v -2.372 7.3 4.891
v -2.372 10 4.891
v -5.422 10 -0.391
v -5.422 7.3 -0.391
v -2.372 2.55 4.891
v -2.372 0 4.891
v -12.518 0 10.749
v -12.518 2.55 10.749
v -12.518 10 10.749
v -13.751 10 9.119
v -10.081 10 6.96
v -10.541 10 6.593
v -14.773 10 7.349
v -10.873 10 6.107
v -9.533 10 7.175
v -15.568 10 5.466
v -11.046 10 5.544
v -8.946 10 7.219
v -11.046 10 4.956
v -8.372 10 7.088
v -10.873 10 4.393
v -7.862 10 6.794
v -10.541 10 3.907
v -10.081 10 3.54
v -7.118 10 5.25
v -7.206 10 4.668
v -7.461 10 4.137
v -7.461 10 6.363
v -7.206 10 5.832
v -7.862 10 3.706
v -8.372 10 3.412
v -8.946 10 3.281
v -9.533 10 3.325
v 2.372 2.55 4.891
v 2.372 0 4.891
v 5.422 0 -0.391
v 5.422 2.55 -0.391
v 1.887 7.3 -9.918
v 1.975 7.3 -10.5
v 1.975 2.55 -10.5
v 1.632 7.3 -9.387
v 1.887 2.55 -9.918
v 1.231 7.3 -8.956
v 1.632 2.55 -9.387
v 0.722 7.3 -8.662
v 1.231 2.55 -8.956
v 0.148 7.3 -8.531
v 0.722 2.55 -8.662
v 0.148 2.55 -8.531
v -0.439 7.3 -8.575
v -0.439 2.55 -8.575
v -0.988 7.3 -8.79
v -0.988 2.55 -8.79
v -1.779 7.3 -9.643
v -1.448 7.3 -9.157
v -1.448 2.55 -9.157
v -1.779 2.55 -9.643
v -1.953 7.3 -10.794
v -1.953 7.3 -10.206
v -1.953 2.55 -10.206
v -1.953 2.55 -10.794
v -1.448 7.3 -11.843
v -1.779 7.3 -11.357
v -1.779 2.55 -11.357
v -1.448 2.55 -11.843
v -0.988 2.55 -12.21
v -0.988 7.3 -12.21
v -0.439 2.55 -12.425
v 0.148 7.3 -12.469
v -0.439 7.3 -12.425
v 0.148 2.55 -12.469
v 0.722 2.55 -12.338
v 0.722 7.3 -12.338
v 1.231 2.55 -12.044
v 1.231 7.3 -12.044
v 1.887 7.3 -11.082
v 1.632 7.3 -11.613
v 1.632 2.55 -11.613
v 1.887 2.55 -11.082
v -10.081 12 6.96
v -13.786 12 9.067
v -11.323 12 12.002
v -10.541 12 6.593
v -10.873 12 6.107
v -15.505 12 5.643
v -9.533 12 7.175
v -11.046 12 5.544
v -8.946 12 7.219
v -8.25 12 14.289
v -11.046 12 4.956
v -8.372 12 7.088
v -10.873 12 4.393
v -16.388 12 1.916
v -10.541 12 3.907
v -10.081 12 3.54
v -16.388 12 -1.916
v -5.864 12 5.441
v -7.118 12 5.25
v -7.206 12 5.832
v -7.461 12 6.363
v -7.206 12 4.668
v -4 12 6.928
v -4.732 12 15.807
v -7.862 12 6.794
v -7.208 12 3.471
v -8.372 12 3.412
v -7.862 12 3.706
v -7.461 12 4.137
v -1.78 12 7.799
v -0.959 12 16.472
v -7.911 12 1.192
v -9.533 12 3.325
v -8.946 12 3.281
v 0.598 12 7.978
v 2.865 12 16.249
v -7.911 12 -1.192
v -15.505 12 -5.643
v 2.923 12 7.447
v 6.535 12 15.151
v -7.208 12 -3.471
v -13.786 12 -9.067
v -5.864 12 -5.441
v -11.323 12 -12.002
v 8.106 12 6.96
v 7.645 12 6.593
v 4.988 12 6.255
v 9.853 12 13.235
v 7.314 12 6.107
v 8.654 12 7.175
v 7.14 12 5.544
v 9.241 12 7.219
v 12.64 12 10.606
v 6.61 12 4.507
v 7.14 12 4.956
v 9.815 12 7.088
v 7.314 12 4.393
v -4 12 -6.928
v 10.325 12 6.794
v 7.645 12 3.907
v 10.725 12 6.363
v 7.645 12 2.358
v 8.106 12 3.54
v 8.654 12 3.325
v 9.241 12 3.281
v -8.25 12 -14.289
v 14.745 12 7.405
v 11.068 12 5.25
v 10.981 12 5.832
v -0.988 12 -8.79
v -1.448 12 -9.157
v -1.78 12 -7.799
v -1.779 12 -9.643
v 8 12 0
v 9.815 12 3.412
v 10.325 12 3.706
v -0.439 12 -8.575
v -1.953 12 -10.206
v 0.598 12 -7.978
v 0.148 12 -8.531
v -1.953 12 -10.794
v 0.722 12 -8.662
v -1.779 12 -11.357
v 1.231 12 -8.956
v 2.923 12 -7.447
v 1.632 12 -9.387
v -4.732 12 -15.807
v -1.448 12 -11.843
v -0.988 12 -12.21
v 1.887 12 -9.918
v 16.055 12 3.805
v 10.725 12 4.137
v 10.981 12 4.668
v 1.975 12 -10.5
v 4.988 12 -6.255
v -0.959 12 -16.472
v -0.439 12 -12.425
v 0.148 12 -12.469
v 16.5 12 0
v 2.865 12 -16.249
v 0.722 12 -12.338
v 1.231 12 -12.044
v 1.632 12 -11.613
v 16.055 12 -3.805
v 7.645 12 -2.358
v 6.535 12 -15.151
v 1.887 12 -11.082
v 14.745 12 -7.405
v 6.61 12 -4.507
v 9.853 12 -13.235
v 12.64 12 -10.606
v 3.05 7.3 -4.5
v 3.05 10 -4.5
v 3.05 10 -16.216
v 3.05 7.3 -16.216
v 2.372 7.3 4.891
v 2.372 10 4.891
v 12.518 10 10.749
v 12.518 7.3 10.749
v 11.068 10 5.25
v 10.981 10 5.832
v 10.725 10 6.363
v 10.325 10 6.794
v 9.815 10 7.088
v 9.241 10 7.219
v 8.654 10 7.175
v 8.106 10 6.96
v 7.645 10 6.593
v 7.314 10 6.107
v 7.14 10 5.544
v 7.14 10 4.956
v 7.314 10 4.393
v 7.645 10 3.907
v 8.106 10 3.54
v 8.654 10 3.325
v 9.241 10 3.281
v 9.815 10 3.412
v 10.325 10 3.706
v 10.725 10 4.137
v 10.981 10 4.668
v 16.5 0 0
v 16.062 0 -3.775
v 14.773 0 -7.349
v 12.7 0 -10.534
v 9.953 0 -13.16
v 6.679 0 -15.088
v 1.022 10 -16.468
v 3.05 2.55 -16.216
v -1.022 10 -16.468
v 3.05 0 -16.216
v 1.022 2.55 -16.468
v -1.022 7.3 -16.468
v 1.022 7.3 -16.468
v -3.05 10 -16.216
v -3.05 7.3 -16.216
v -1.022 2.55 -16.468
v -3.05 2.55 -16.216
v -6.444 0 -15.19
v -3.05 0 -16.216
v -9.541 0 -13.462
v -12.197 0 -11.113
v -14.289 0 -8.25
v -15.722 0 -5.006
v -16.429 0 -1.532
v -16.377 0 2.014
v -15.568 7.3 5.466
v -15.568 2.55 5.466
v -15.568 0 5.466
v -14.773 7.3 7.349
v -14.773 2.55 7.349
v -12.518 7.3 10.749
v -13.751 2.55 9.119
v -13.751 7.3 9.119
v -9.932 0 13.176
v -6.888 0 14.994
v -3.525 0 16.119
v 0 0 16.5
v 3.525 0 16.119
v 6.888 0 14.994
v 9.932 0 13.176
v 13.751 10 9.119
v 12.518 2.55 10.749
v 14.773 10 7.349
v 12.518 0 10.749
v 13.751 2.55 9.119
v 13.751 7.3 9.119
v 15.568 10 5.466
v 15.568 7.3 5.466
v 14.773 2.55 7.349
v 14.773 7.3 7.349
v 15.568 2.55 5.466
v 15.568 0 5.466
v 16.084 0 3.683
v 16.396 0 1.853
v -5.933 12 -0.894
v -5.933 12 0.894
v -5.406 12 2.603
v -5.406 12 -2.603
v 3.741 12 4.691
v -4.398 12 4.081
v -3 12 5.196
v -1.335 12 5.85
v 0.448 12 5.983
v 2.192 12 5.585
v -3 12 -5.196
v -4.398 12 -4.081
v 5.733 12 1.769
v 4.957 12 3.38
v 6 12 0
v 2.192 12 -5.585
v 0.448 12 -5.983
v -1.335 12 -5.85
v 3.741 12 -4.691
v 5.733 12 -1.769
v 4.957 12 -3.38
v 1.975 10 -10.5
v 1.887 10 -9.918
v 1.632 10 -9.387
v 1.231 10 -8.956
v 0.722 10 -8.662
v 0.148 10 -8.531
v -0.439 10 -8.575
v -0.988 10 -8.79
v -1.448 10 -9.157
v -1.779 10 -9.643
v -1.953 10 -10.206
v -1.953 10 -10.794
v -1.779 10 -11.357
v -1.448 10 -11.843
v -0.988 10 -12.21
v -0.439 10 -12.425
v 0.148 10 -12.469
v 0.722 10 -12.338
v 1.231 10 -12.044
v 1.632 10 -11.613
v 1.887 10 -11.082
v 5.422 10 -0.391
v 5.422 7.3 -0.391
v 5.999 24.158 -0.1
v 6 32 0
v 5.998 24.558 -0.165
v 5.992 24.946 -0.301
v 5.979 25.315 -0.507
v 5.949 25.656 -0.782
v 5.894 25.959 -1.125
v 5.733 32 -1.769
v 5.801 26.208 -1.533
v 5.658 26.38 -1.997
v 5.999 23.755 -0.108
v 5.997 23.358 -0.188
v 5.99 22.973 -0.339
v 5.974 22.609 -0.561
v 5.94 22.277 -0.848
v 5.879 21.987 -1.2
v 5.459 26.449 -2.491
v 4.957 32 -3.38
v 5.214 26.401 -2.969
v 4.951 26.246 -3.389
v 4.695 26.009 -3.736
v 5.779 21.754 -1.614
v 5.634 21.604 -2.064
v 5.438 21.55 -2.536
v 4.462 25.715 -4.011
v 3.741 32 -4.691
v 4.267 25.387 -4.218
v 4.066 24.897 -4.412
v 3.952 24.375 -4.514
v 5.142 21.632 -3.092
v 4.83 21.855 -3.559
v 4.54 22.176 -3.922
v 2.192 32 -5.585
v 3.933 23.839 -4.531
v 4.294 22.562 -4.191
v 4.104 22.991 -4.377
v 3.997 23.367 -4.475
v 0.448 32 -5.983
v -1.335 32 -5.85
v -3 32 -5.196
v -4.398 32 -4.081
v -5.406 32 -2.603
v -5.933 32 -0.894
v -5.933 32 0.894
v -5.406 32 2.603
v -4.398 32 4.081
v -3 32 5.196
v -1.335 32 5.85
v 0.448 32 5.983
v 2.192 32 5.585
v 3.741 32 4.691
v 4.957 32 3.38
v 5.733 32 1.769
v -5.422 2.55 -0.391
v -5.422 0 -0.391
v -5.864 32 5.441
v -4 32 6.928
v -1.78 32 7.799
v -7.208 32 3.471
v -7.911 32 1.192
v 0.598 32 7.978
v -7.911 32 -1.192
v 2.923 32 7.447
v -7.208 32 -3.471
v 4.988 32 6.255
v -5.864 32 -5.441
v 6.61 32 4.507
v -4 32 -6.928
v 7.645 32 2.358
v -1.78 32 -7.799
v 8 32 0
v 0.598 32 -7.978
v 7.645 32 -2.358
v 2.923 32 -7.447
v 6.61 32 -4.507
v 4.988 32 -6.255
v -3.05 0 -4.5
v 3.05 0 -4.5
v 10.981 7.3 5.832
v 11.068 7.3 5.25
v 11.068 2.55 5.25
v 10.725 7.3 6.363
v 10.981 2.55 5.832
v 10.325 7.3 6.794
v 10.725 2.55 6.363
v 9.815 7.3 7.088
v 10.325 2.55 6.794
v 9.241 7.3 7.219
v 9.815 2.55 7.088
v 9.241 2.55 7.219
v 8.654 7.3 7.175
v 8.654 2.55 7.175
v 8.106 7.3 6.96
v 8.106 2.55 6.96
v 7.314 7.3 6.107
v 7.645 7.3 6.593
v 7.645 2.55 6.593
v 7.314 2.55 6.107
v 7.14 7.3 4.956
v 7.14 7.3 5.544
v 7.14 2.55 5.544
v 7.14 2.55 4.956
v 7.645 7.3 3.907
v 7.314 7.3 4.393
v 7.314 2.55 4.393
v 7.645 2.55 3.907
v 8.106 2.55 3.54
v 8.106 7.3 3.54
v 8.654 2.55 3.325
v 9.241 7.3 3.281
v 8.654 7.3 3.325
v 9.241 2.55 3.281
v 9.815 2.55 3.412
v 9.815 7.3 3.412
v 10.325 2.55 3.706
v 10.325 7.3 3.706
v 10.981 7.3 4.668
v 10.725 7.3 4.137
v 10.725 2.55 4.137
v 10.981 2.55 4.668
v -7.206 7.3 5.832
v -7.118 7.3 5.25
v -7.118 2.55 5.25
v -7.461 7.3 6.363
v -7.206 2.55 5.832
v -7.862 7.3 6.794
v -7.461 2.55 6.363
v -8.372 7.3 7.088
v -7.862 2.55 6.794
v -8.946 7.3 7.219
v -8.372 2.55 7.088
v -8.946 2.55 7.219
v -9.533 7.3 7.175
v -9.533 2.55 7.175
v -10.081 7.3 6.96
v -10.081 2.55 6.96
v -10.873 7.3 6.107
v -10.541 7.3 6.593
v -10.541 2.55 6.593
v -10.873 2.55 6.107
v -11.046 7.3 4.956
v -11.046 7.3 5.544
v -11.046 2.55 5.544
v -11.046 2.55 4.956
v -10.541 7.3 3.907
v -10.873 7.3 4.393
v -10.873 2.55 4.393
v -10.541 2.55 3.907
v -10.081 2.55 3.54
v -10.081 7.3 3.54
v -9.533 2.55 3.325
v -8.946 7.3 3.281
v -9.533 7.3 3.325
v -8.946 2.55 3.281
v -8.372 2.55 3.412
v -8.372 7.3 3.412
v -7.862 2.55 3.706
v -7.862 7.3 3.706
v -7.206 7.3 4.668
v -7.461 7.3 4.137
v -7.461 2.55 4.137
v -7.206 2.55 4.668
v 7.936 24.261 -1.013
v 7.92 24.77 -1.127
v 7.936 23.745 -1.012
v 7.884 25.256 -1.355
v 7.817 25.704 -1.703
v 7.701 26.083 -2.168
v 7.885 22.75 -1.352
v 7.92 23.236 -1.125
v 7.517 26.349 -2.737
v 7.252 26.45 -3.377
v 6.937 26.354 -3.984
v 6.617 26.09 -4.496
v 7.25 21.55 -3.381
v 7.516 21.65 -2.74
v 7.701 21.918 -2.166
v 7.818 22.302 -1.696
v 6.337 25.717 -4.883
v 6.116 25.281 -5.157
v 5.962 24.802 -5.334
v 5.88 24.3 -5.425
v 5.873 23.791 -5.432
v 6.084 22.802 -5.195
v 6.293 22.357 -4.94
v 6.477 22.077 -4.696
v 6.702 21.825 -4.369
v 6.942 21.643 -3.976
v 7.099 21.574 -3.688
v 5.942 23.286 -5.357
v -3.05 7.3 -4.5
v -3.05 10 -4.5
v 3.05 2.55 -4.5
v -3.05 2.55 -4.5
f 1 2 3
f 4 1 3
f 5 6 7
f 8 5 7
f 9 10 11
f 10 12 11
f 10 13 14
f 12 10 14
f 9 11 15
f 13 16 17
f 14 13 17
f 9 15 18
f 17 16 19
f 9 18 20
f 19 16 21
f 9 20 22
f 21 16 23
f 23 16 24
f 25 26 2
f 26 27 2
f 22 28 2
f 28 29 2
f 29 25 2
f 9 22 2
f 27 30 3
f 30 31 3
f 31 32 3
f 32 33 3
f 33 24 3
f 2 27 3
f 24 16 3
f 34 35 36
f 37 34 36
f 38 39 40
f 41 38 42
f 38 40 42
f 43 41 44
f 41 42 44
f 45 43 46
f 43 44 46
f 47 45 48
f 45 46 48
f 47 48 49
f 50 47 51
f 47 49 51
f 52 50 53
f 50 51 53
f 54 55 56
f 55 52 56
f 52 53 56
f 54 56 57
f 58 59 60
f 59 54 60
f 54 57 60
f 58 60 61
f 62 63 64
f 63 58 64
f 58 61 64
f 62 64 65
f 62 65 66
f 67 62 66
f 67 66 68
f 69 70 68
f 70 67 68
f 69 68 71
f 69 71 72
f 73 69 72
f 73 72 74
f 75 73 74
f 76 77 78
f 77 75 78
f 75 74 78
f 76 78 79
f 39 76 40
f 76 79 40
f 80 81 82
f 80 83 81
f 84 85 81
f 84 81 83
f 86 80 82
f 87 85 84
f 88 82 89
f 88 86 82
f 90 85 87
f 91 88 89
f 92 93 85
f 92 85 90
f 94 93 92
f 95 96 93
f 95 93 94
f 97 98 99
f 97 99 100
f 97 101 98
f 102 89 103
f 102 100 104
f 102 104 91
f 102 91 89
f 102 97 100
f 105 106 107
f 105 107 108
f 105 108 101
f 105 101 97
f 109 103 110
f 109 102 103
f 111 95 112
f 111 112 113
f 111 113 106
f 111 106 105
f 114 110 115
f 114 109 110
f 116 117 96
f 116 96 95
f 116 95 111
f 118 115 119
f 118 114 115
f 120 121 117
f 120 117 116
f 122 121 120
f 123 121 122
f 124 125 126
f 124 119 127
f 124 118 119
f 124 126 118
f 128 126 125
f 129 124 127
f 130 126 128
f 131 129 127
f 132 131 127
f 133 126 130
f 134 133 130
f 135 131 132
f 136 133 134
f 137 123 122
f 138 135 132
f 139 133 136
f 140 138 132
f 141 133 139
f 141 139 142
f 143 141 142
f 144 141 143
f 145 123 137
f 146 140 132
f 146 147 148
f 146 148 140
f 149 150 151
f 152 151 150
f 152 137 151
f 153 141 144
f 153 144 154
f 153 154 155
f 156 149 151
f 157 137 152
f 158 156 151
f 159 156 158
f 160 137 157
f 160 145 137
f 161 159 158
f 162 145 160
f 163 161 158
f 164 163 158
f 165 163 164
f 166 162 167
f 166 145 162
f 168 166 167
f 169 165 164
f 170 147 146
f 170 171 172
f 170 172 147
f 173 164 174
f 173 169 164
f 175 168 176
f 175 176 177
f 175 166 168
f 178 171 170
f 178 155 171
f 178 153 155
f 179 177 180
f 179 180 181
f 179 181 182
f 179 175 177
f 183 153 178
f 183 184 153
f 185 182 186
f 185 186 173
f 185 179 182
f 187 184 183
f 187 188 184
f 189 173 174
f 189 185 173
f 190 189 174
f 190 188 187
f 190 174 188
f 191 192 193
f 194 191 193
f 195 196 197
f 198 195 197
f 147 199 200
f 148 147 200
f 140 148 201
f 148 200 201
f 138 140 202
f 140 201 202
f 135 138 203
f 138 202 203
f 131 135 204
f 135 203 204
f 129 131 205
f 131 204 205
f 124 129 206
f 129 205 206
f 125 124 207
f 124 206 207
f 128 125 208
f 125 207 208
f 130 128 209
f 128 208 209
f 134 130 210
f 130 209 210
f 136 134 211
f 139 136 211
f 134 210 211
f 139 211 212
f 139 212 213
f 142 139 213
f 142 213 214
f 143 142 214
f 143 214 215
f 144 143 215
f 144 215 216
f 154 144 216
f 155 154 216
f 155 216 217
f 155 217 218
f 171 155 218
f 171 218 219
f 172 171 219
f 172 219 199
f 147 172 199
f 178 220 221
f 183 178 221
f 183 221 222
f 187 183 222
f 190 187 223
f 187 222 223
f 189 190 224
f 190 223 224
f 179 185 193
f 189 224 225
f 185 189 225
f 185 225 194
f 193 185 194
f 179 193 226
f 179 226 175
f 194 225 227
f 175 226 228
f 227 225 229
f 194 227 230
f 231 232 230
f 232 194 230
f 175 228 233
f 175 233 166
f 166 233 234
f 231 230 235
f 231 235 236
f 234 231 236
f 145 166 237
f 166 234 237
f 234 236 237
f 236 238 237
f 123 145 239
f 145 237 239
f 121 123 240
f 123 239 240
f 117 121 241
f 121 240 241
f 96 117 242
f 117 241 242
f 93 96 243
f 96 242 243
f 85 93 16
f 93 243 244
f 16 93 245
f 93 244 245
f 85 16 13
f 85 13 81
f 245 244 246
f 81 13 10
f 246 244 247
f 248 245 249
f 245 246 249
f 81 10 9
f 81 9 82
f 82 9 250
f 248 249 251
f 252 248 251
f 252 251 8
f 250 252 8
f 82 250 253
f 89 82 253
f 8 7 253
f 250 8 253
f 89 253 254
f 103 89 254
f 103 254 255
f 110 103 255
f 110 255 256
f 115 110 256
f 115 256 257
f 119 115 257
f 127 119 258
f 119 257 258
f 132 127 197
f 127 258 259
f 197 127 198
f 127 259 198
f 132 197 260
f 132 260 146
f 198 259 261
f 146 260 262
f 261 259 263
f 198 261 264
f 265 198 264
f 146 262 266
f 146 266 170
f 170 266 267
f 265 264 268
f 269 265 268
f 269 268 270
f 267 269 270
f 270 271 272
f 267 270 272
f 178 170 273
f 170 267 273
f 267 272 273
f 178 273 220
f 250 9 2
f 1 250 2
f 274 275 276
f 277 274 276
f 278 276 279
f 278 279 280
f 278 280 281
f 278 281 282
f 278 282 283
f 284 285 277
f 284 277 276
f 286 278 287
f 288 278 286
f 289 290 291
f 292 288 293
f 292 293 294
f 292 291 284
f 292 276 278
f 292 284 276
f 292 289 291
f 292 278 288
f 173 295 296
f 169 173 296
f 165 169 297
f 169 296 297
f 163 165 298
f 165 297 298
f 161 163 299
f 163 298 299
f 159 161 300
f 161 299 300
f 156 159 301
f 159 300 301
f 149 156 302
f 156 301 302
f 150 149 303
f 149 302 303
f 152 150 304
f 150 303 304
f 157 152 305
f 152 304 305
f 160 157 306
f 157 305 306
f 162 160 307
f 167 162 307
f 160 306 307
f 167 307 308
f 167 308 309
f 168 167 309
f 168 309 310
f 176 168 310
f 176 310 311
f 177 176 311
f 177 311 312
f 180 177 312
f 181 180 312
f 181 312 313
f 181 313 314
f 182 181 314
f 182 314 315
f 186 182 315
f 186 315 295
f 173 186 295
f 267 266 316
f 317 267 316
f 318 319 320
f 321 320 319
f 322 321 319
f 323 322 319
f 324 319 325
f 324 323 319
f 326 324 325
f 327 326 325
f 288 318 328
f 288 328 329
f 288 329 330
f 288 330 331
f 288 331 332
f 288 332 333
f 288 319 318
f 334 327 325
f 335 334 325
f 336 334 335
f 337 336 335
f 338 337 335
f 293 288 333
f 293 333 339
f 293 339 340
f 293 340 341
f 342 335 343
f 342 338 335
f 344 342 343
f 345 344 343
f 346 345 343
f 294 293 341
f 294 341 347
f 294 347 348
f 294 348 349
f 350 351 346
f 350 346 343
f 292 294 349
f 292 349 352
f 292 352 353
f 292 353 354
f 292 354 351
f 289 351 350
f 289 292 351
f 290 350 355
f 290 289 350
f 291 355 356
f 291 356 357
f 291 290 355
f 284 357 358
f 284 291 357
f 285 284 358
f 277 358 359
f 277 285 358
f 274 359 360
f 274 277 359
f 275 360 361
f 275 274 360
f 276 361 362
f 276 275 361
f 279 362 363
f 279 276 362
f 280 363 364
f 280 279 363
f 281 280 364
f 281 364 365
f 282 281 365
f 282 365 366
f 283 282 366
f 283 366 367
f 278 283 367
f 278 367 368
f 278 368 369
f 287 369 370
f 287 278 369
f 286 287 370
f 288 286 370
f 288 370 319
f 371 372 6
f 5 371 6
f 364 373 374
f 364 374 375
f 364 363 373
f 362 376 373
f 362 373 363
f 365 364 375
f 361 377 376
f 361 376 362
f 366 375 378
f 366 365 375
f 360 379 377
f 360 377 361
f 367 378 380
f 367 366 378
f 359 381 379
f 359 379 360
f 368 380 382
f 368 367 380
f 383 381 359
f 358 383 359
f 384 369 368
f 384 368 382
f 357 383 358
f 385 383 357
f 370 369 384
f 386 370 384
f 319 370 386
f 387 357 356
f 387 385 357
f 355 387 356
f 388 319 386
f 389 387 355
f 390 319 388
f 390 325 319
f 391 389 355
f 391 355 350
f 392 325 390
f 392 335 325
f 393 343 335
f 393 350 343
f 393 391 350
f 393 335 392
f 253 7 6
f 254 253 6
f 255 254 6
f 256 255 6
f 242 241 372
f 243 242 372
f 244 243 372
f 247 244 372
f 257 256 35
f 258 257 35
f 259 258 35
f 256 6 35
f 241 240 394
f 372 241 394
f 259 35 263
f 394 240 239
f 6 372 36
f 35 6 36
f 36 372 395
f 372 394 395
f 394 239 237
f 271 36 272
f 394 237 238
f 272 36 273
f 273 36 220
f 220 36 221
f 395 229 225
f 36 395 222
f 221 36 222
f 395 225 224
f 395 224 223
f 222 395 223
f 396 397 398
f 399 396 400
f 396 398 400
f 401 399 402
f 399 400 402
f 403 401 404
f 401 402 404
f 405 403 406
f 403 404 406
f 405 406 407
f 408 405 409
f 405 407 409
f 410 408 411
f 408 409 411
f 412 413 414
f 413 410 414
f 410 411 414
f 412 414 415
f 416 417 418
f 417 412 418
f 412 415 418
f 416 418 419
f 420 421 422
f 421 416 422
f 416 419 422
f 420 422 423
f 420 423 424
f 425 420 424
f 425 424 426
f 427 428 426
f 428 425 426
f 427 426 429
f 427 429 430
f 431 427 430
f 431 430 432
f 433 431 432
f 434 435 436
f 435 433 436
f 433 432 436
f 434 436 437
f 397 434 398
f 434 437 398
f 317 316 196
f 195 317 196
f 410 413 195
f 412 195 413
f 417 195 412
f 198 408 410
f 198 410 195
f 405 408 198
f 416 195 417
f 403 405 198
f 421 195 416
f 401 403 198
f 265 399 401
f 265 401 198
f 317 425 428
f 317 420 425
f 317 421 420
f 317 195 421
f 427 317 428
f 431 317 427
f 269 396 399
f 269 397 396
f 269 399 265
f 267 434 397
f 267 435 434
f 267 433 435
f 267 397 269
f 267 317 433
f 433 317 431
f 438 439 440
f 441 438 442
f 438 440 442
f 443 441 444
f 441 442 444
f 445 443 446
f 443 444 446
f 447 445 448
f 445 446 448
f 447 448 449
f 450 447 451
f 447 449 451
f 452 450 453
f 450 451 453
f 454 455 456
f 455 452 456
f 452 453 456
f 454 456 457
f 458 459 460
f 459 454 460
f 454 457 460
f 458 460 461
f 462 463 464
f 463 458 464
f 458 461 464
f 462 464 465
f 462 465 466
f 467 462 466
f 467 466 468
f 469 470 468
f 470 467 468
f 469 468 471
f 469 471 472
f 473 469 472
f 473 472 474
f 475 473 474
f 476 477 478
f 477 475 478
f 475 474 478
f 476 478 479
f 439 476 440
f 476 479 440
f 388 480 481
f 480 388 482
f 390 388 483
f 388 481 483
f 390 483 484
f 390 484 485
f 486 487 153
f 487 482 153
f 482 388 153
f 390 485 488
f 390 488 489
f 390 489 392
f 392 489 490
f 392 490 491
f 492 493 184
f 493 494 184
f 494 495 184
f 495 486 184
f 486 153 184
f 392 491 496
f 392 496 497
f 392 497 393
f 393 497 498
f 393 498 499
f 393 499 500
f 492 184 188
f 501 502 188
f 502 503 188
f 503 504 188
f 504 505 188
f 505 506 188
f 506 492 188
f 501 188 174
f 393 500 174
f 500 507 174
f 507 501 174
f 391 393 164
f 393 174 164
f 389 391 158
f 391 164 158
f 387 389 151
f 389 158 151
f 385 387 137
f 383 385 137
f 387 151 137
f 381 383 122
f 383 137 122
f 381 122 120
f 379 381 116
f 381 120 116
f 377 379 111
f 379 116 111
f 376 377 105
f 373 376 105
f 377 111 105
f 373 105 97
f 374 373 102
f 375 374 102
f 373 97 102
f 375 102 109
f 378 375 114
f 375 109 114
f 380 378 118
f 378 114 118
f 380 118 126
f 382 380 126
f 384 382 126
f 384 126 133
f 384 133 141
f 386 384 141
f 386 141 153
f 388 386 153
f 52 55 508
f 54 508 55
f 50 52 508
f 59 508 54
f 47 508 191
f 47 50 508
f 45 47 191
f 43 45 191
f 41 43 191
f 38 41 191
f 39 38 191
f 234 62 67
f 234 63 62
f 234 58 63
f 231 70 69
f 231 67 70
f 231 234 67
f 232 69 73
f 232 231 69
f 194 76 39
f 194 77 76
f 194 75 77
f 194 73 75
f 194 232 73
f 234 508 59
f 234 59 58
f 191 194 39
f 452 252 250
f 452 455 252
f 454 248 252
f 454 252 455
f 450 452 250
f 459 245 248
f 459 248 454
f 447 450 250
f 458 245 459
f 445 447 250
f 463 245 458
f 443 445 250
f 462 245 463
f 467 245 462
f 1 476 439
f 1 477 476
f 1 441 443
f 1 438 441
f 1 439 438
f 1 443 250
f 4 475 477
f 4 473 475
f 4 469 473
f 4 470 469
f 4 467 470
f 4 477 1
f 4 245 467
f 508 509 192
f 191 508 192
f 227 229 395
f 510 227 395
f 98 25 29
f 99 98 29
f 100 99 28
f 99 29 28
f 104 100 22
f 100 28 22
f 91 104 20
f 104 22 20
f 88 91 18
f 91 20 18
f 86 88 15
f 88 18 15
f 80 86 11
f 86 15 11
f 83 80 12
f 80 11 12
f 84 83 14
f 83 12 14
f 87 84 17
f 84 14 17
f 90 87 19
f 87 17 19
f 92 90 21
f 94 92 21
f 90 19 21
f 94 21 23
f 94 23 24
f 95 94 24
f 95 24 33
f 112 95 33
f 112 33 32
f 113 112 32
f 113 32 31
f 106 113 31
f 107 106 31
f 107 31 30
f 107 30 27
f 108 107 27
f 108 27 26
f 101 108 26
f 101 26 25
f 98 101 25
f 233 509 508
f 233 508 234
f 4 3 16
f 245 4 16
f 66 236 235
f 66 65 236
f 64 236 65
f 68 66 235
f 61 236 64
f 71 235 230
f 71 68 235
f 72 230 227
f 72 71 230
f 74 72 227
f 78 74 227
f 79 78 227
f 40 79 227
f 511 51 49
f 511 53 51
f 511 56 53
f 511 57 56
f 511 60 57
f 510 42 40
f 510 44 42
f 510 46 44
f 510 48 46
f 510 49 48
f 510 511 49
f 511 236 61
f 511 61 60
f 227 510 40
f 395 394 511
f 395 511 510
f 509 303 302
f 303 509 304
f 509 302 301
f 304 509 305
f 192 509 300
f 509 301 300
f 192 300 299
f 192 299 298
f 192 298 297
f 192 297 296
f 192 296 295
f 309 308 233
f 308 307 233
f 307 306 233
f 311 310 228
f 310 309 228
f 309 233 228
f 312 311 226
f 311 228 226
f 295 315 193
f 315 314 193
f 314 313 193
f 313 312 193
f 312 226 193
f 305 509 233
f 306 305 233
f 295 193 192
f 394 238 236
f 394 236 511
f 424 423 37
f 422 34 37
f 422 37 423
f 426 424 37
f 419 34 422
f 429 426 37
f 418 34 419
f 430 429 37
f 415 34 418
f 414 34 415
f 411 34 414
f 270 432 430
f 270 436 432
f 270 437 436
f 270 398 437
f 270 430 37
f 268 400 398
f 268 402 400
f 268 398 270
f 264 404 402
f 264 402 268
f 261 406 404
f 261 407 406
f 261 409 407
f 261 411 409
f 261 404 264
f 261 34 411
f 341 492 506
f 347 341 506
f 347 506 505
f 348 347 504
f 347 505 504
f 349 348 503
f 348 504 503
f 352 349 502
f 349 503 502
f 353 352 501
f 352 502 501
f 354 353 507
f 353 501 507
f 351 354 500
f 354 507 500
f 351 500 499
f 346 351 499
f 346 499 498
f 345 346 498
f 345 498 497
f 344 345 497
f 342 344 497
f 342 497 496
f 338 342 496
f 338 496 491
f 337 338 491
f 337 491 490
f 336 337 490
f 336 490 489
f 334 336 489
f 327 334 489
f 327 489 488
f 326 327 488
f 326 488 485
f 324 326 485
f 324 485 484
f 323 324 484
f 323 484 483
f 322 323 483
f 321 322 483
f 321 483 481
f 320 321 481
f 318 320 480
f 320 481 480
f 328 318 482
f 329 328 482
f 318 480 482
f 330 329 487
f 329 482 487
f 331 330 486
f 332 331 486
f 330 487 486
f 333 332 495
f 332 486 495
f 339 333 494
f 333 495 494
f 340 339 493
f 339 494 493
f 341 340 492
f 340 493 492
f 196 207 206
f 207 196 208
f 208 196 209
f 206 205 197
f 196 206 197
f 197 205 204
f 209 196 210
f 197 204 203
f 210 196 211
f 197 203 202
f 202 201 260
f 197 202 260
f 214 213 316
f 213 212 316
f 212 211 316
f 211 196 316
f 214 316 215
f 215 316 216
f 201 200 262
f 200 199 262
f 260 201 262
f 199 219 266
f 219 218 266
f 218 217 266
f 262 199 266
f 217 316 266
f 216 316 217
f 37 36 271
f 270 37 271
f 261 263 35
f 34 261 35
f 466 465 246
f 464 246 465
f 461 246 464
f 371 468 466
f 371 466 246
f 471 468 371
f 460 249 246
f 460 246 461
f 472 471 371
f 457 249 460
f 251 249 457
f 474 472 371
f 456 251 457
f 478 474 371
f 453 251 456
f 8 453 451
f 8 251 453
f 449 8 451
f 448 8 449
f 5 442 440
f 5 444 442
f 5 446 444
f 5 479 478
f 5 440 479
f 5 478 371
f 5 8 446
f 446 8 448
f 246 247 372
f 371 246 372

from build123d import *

# Parameters (mm, degrees)
CROQUIS1_R              = 16.5
SALIENTE_EXTRUIR1_DEPTH = 12
CROQUIS2_R              = 1.975
CROQUIS2_W              = 6.1
CROQUIS2_H              = 12
CORTAR_EXTRUIR1_DEPTH   = 2.55
CROQUIS2_2_R            = 1.975
CORTAR_EXTRUIR2_DEPTH   = 27.239283527
CORTAR_EXTRUIR3_START   = -2.7
CROQUIS3_W              = 6.1
CROQUIS3_H              = 12
CROQUIS3_R              = 1.975
CORTAR_EXTRUIR3_DEPTH   = 2.7
CROQUIS4_R              = 8
CROQUIS4_R_2            = 6
EXTRUIR_L_MINA1_DEPTH   = 20
CORTAR_EXTRUIR4_REACH   = 46.535
CROQUIS5_R              = 2.45


with BuildPart() as part:
    # Croquis1 → Saliente-Extruir1 (new body)
    with BuildSketch(Plane(origin=(0, 0, 0), x_dir=(1, 0, 0), z_dir=(0, 1, 0))):
        Circle(CROQUIS1_R)
    extrude(amount=SALIENTE_EXTRUIR1_DEPTH)

    # Croquis2 → Cortar-Extruir1 (cut)
    # profile 1 of 3: a face of its own
    with BuildSketch(Plane.XZ):
        Polygon((-12.764419162, 10.891377482), (-15.814419162, 5.608622518), (-5.422114317, -0.391377482), (-2.372114317, 4.891377482), align=None)
        with Locations((-9.09326674, 5.25)):
            Circle(CROQUIS2_R, mode=Mode.SUBTRACT)
    # profile 2 of 3: a face of its own
    with BuildSketch(Plane.XZ):
        with Locations((0, -10.5)):
            Rectangle(CROQUIS2_W, CROQUIS2_H)
        with Locations((0, -10.5)):
            Circle(CROQUIS2_R, mode=Mode.SUBTRACT)
    # profile 3 of 3: a face of its own
    with BuildSketch(Plane.XZ):
        Polygon((15.814419162, 5.608622518), (12.764419162, 10.891377482), (2.372114317, 4.891377482), (5.422114317, -0.391377482), align=None)
        with Locations((9.09326674, 5.25)):
            Circle(CROQUIS2_R, mode=Mode.SUBTRACT)
    extrude(amount=-CORTAR_EXTRUIR1_DEPTH, mode=Mode.SUBTRACT)

    # Croquis2<2> → Cortar-Extruir2 (cut, through all)
    with BuildSketch(Plane.XZ):
        with Locations((0, -10.5)):
            Circle(CROQUIS2_2_R)
        with Locations((-9.09326674, 5.25)):
            Circle(CROQUIS2_2_R)
        with Locations((9.09326674, 5.25)):
            Circle(CROQUIS2_2_R)
    extrude(amount=-CORTAR_EXTRUIR2_DEPTH, mode=Mode.SUBTRACT)

    # Croquis3 → Cortar-Extruir3 (cut)
    # profile 1 of 3: a face of its own
    with BuildSketch(Plane(origin=(0, 10, 0), x_dir=(1, 0, 0), z_dir=(0, 1, 0)).offset(CORTAR_EXTRUIR3_START)):
        with Locations((0, 10.5)):
            Rectangle(CROQUIS3_W, CROQUIS3_H)
        with Locations((0, 10.5)):
            Circle(CROQUIS3_R, mode=Mode.SUBTRACT)
    # profile 2 of 3: a face of its own
    with BuildSketch(Plane(origin=(0, 10, 0), x_dir=(1, 0, 0), z_dir=(0, 1, 0)).offset(CORTAR_EXTRUIR3_START)):
        Polygon((12.764419162, -10.891377482), (15.814419162, -5.608622518), (5.422114317, 0.391377482), (2.372114317, -4.891377482), align=None)
        with Locations((9.09326674, -5.25)):
            Circle(CROQUIS3_R, mode=Mode.SUBTRACT)
    # profile 3 of 3: a face of its own
    with BuildSketch(Plane(origin=(0, 10, 0), x_dir=(1, 0, 0), z_dir=(0, 1, 0)).offset(CORTAR_EXTRUIR3_START)):
        Polygon((-15.814419162, -5.608622518), (-12.764419162, -10.891377482), (-2.372114317, -4.891377482), (-5.422114317, 0.391377482), align=None)
        with Locations((-9.09326674, -5.25)):
            Circle(CROQUIS3_R, mode=Mode.SUBTRACT)
    extrude(amount=CORTAR_EXTRUIR3_DEPTH, mode=Mode.SUBTRACT)

    # Croquis4 → Extruir-Lámina1 (add)
    with BuildSketch(Plane(origin=(0, 12, 0), x_dir=(1, 0, 0), z_dir=(0, 1, 0))):
        Circle(CROQUIS4_R)
        Circle(CROQUIS4_R_2, mode=Mode.SUBTRACT)
    extrude(amount=EXTRUIR_L_MINA1_DEPTH)

    # Croquis5 → Cortar-Extruir4 (cut, up to next)
    with BuildSketch(Plane(origin=(7.250462296, 0, -3.380946094), x_dir=(0, -1, 0), z_dir=(0.906307787036651, 0, -0.4226182617406972)), mode=Mode.PRIVATE) as cortar_extruir4_sk1:
        with Locations((-24, 0)):
            Circle(CROQUIS5_R)
    cortar_extruir4_tool1 = extrude(cortar_extruir4_sk1.sketch, amount=-CORTAR_EXTRUIR4_REACH, mode=Mode.PRIVATE) & part.part
    add(cortar_extruir4_tool1.solids().sort_by_distance((7.250462, 24, -3.380946))[0], mode=Mode.SUBTRACT)


solid = part.part
